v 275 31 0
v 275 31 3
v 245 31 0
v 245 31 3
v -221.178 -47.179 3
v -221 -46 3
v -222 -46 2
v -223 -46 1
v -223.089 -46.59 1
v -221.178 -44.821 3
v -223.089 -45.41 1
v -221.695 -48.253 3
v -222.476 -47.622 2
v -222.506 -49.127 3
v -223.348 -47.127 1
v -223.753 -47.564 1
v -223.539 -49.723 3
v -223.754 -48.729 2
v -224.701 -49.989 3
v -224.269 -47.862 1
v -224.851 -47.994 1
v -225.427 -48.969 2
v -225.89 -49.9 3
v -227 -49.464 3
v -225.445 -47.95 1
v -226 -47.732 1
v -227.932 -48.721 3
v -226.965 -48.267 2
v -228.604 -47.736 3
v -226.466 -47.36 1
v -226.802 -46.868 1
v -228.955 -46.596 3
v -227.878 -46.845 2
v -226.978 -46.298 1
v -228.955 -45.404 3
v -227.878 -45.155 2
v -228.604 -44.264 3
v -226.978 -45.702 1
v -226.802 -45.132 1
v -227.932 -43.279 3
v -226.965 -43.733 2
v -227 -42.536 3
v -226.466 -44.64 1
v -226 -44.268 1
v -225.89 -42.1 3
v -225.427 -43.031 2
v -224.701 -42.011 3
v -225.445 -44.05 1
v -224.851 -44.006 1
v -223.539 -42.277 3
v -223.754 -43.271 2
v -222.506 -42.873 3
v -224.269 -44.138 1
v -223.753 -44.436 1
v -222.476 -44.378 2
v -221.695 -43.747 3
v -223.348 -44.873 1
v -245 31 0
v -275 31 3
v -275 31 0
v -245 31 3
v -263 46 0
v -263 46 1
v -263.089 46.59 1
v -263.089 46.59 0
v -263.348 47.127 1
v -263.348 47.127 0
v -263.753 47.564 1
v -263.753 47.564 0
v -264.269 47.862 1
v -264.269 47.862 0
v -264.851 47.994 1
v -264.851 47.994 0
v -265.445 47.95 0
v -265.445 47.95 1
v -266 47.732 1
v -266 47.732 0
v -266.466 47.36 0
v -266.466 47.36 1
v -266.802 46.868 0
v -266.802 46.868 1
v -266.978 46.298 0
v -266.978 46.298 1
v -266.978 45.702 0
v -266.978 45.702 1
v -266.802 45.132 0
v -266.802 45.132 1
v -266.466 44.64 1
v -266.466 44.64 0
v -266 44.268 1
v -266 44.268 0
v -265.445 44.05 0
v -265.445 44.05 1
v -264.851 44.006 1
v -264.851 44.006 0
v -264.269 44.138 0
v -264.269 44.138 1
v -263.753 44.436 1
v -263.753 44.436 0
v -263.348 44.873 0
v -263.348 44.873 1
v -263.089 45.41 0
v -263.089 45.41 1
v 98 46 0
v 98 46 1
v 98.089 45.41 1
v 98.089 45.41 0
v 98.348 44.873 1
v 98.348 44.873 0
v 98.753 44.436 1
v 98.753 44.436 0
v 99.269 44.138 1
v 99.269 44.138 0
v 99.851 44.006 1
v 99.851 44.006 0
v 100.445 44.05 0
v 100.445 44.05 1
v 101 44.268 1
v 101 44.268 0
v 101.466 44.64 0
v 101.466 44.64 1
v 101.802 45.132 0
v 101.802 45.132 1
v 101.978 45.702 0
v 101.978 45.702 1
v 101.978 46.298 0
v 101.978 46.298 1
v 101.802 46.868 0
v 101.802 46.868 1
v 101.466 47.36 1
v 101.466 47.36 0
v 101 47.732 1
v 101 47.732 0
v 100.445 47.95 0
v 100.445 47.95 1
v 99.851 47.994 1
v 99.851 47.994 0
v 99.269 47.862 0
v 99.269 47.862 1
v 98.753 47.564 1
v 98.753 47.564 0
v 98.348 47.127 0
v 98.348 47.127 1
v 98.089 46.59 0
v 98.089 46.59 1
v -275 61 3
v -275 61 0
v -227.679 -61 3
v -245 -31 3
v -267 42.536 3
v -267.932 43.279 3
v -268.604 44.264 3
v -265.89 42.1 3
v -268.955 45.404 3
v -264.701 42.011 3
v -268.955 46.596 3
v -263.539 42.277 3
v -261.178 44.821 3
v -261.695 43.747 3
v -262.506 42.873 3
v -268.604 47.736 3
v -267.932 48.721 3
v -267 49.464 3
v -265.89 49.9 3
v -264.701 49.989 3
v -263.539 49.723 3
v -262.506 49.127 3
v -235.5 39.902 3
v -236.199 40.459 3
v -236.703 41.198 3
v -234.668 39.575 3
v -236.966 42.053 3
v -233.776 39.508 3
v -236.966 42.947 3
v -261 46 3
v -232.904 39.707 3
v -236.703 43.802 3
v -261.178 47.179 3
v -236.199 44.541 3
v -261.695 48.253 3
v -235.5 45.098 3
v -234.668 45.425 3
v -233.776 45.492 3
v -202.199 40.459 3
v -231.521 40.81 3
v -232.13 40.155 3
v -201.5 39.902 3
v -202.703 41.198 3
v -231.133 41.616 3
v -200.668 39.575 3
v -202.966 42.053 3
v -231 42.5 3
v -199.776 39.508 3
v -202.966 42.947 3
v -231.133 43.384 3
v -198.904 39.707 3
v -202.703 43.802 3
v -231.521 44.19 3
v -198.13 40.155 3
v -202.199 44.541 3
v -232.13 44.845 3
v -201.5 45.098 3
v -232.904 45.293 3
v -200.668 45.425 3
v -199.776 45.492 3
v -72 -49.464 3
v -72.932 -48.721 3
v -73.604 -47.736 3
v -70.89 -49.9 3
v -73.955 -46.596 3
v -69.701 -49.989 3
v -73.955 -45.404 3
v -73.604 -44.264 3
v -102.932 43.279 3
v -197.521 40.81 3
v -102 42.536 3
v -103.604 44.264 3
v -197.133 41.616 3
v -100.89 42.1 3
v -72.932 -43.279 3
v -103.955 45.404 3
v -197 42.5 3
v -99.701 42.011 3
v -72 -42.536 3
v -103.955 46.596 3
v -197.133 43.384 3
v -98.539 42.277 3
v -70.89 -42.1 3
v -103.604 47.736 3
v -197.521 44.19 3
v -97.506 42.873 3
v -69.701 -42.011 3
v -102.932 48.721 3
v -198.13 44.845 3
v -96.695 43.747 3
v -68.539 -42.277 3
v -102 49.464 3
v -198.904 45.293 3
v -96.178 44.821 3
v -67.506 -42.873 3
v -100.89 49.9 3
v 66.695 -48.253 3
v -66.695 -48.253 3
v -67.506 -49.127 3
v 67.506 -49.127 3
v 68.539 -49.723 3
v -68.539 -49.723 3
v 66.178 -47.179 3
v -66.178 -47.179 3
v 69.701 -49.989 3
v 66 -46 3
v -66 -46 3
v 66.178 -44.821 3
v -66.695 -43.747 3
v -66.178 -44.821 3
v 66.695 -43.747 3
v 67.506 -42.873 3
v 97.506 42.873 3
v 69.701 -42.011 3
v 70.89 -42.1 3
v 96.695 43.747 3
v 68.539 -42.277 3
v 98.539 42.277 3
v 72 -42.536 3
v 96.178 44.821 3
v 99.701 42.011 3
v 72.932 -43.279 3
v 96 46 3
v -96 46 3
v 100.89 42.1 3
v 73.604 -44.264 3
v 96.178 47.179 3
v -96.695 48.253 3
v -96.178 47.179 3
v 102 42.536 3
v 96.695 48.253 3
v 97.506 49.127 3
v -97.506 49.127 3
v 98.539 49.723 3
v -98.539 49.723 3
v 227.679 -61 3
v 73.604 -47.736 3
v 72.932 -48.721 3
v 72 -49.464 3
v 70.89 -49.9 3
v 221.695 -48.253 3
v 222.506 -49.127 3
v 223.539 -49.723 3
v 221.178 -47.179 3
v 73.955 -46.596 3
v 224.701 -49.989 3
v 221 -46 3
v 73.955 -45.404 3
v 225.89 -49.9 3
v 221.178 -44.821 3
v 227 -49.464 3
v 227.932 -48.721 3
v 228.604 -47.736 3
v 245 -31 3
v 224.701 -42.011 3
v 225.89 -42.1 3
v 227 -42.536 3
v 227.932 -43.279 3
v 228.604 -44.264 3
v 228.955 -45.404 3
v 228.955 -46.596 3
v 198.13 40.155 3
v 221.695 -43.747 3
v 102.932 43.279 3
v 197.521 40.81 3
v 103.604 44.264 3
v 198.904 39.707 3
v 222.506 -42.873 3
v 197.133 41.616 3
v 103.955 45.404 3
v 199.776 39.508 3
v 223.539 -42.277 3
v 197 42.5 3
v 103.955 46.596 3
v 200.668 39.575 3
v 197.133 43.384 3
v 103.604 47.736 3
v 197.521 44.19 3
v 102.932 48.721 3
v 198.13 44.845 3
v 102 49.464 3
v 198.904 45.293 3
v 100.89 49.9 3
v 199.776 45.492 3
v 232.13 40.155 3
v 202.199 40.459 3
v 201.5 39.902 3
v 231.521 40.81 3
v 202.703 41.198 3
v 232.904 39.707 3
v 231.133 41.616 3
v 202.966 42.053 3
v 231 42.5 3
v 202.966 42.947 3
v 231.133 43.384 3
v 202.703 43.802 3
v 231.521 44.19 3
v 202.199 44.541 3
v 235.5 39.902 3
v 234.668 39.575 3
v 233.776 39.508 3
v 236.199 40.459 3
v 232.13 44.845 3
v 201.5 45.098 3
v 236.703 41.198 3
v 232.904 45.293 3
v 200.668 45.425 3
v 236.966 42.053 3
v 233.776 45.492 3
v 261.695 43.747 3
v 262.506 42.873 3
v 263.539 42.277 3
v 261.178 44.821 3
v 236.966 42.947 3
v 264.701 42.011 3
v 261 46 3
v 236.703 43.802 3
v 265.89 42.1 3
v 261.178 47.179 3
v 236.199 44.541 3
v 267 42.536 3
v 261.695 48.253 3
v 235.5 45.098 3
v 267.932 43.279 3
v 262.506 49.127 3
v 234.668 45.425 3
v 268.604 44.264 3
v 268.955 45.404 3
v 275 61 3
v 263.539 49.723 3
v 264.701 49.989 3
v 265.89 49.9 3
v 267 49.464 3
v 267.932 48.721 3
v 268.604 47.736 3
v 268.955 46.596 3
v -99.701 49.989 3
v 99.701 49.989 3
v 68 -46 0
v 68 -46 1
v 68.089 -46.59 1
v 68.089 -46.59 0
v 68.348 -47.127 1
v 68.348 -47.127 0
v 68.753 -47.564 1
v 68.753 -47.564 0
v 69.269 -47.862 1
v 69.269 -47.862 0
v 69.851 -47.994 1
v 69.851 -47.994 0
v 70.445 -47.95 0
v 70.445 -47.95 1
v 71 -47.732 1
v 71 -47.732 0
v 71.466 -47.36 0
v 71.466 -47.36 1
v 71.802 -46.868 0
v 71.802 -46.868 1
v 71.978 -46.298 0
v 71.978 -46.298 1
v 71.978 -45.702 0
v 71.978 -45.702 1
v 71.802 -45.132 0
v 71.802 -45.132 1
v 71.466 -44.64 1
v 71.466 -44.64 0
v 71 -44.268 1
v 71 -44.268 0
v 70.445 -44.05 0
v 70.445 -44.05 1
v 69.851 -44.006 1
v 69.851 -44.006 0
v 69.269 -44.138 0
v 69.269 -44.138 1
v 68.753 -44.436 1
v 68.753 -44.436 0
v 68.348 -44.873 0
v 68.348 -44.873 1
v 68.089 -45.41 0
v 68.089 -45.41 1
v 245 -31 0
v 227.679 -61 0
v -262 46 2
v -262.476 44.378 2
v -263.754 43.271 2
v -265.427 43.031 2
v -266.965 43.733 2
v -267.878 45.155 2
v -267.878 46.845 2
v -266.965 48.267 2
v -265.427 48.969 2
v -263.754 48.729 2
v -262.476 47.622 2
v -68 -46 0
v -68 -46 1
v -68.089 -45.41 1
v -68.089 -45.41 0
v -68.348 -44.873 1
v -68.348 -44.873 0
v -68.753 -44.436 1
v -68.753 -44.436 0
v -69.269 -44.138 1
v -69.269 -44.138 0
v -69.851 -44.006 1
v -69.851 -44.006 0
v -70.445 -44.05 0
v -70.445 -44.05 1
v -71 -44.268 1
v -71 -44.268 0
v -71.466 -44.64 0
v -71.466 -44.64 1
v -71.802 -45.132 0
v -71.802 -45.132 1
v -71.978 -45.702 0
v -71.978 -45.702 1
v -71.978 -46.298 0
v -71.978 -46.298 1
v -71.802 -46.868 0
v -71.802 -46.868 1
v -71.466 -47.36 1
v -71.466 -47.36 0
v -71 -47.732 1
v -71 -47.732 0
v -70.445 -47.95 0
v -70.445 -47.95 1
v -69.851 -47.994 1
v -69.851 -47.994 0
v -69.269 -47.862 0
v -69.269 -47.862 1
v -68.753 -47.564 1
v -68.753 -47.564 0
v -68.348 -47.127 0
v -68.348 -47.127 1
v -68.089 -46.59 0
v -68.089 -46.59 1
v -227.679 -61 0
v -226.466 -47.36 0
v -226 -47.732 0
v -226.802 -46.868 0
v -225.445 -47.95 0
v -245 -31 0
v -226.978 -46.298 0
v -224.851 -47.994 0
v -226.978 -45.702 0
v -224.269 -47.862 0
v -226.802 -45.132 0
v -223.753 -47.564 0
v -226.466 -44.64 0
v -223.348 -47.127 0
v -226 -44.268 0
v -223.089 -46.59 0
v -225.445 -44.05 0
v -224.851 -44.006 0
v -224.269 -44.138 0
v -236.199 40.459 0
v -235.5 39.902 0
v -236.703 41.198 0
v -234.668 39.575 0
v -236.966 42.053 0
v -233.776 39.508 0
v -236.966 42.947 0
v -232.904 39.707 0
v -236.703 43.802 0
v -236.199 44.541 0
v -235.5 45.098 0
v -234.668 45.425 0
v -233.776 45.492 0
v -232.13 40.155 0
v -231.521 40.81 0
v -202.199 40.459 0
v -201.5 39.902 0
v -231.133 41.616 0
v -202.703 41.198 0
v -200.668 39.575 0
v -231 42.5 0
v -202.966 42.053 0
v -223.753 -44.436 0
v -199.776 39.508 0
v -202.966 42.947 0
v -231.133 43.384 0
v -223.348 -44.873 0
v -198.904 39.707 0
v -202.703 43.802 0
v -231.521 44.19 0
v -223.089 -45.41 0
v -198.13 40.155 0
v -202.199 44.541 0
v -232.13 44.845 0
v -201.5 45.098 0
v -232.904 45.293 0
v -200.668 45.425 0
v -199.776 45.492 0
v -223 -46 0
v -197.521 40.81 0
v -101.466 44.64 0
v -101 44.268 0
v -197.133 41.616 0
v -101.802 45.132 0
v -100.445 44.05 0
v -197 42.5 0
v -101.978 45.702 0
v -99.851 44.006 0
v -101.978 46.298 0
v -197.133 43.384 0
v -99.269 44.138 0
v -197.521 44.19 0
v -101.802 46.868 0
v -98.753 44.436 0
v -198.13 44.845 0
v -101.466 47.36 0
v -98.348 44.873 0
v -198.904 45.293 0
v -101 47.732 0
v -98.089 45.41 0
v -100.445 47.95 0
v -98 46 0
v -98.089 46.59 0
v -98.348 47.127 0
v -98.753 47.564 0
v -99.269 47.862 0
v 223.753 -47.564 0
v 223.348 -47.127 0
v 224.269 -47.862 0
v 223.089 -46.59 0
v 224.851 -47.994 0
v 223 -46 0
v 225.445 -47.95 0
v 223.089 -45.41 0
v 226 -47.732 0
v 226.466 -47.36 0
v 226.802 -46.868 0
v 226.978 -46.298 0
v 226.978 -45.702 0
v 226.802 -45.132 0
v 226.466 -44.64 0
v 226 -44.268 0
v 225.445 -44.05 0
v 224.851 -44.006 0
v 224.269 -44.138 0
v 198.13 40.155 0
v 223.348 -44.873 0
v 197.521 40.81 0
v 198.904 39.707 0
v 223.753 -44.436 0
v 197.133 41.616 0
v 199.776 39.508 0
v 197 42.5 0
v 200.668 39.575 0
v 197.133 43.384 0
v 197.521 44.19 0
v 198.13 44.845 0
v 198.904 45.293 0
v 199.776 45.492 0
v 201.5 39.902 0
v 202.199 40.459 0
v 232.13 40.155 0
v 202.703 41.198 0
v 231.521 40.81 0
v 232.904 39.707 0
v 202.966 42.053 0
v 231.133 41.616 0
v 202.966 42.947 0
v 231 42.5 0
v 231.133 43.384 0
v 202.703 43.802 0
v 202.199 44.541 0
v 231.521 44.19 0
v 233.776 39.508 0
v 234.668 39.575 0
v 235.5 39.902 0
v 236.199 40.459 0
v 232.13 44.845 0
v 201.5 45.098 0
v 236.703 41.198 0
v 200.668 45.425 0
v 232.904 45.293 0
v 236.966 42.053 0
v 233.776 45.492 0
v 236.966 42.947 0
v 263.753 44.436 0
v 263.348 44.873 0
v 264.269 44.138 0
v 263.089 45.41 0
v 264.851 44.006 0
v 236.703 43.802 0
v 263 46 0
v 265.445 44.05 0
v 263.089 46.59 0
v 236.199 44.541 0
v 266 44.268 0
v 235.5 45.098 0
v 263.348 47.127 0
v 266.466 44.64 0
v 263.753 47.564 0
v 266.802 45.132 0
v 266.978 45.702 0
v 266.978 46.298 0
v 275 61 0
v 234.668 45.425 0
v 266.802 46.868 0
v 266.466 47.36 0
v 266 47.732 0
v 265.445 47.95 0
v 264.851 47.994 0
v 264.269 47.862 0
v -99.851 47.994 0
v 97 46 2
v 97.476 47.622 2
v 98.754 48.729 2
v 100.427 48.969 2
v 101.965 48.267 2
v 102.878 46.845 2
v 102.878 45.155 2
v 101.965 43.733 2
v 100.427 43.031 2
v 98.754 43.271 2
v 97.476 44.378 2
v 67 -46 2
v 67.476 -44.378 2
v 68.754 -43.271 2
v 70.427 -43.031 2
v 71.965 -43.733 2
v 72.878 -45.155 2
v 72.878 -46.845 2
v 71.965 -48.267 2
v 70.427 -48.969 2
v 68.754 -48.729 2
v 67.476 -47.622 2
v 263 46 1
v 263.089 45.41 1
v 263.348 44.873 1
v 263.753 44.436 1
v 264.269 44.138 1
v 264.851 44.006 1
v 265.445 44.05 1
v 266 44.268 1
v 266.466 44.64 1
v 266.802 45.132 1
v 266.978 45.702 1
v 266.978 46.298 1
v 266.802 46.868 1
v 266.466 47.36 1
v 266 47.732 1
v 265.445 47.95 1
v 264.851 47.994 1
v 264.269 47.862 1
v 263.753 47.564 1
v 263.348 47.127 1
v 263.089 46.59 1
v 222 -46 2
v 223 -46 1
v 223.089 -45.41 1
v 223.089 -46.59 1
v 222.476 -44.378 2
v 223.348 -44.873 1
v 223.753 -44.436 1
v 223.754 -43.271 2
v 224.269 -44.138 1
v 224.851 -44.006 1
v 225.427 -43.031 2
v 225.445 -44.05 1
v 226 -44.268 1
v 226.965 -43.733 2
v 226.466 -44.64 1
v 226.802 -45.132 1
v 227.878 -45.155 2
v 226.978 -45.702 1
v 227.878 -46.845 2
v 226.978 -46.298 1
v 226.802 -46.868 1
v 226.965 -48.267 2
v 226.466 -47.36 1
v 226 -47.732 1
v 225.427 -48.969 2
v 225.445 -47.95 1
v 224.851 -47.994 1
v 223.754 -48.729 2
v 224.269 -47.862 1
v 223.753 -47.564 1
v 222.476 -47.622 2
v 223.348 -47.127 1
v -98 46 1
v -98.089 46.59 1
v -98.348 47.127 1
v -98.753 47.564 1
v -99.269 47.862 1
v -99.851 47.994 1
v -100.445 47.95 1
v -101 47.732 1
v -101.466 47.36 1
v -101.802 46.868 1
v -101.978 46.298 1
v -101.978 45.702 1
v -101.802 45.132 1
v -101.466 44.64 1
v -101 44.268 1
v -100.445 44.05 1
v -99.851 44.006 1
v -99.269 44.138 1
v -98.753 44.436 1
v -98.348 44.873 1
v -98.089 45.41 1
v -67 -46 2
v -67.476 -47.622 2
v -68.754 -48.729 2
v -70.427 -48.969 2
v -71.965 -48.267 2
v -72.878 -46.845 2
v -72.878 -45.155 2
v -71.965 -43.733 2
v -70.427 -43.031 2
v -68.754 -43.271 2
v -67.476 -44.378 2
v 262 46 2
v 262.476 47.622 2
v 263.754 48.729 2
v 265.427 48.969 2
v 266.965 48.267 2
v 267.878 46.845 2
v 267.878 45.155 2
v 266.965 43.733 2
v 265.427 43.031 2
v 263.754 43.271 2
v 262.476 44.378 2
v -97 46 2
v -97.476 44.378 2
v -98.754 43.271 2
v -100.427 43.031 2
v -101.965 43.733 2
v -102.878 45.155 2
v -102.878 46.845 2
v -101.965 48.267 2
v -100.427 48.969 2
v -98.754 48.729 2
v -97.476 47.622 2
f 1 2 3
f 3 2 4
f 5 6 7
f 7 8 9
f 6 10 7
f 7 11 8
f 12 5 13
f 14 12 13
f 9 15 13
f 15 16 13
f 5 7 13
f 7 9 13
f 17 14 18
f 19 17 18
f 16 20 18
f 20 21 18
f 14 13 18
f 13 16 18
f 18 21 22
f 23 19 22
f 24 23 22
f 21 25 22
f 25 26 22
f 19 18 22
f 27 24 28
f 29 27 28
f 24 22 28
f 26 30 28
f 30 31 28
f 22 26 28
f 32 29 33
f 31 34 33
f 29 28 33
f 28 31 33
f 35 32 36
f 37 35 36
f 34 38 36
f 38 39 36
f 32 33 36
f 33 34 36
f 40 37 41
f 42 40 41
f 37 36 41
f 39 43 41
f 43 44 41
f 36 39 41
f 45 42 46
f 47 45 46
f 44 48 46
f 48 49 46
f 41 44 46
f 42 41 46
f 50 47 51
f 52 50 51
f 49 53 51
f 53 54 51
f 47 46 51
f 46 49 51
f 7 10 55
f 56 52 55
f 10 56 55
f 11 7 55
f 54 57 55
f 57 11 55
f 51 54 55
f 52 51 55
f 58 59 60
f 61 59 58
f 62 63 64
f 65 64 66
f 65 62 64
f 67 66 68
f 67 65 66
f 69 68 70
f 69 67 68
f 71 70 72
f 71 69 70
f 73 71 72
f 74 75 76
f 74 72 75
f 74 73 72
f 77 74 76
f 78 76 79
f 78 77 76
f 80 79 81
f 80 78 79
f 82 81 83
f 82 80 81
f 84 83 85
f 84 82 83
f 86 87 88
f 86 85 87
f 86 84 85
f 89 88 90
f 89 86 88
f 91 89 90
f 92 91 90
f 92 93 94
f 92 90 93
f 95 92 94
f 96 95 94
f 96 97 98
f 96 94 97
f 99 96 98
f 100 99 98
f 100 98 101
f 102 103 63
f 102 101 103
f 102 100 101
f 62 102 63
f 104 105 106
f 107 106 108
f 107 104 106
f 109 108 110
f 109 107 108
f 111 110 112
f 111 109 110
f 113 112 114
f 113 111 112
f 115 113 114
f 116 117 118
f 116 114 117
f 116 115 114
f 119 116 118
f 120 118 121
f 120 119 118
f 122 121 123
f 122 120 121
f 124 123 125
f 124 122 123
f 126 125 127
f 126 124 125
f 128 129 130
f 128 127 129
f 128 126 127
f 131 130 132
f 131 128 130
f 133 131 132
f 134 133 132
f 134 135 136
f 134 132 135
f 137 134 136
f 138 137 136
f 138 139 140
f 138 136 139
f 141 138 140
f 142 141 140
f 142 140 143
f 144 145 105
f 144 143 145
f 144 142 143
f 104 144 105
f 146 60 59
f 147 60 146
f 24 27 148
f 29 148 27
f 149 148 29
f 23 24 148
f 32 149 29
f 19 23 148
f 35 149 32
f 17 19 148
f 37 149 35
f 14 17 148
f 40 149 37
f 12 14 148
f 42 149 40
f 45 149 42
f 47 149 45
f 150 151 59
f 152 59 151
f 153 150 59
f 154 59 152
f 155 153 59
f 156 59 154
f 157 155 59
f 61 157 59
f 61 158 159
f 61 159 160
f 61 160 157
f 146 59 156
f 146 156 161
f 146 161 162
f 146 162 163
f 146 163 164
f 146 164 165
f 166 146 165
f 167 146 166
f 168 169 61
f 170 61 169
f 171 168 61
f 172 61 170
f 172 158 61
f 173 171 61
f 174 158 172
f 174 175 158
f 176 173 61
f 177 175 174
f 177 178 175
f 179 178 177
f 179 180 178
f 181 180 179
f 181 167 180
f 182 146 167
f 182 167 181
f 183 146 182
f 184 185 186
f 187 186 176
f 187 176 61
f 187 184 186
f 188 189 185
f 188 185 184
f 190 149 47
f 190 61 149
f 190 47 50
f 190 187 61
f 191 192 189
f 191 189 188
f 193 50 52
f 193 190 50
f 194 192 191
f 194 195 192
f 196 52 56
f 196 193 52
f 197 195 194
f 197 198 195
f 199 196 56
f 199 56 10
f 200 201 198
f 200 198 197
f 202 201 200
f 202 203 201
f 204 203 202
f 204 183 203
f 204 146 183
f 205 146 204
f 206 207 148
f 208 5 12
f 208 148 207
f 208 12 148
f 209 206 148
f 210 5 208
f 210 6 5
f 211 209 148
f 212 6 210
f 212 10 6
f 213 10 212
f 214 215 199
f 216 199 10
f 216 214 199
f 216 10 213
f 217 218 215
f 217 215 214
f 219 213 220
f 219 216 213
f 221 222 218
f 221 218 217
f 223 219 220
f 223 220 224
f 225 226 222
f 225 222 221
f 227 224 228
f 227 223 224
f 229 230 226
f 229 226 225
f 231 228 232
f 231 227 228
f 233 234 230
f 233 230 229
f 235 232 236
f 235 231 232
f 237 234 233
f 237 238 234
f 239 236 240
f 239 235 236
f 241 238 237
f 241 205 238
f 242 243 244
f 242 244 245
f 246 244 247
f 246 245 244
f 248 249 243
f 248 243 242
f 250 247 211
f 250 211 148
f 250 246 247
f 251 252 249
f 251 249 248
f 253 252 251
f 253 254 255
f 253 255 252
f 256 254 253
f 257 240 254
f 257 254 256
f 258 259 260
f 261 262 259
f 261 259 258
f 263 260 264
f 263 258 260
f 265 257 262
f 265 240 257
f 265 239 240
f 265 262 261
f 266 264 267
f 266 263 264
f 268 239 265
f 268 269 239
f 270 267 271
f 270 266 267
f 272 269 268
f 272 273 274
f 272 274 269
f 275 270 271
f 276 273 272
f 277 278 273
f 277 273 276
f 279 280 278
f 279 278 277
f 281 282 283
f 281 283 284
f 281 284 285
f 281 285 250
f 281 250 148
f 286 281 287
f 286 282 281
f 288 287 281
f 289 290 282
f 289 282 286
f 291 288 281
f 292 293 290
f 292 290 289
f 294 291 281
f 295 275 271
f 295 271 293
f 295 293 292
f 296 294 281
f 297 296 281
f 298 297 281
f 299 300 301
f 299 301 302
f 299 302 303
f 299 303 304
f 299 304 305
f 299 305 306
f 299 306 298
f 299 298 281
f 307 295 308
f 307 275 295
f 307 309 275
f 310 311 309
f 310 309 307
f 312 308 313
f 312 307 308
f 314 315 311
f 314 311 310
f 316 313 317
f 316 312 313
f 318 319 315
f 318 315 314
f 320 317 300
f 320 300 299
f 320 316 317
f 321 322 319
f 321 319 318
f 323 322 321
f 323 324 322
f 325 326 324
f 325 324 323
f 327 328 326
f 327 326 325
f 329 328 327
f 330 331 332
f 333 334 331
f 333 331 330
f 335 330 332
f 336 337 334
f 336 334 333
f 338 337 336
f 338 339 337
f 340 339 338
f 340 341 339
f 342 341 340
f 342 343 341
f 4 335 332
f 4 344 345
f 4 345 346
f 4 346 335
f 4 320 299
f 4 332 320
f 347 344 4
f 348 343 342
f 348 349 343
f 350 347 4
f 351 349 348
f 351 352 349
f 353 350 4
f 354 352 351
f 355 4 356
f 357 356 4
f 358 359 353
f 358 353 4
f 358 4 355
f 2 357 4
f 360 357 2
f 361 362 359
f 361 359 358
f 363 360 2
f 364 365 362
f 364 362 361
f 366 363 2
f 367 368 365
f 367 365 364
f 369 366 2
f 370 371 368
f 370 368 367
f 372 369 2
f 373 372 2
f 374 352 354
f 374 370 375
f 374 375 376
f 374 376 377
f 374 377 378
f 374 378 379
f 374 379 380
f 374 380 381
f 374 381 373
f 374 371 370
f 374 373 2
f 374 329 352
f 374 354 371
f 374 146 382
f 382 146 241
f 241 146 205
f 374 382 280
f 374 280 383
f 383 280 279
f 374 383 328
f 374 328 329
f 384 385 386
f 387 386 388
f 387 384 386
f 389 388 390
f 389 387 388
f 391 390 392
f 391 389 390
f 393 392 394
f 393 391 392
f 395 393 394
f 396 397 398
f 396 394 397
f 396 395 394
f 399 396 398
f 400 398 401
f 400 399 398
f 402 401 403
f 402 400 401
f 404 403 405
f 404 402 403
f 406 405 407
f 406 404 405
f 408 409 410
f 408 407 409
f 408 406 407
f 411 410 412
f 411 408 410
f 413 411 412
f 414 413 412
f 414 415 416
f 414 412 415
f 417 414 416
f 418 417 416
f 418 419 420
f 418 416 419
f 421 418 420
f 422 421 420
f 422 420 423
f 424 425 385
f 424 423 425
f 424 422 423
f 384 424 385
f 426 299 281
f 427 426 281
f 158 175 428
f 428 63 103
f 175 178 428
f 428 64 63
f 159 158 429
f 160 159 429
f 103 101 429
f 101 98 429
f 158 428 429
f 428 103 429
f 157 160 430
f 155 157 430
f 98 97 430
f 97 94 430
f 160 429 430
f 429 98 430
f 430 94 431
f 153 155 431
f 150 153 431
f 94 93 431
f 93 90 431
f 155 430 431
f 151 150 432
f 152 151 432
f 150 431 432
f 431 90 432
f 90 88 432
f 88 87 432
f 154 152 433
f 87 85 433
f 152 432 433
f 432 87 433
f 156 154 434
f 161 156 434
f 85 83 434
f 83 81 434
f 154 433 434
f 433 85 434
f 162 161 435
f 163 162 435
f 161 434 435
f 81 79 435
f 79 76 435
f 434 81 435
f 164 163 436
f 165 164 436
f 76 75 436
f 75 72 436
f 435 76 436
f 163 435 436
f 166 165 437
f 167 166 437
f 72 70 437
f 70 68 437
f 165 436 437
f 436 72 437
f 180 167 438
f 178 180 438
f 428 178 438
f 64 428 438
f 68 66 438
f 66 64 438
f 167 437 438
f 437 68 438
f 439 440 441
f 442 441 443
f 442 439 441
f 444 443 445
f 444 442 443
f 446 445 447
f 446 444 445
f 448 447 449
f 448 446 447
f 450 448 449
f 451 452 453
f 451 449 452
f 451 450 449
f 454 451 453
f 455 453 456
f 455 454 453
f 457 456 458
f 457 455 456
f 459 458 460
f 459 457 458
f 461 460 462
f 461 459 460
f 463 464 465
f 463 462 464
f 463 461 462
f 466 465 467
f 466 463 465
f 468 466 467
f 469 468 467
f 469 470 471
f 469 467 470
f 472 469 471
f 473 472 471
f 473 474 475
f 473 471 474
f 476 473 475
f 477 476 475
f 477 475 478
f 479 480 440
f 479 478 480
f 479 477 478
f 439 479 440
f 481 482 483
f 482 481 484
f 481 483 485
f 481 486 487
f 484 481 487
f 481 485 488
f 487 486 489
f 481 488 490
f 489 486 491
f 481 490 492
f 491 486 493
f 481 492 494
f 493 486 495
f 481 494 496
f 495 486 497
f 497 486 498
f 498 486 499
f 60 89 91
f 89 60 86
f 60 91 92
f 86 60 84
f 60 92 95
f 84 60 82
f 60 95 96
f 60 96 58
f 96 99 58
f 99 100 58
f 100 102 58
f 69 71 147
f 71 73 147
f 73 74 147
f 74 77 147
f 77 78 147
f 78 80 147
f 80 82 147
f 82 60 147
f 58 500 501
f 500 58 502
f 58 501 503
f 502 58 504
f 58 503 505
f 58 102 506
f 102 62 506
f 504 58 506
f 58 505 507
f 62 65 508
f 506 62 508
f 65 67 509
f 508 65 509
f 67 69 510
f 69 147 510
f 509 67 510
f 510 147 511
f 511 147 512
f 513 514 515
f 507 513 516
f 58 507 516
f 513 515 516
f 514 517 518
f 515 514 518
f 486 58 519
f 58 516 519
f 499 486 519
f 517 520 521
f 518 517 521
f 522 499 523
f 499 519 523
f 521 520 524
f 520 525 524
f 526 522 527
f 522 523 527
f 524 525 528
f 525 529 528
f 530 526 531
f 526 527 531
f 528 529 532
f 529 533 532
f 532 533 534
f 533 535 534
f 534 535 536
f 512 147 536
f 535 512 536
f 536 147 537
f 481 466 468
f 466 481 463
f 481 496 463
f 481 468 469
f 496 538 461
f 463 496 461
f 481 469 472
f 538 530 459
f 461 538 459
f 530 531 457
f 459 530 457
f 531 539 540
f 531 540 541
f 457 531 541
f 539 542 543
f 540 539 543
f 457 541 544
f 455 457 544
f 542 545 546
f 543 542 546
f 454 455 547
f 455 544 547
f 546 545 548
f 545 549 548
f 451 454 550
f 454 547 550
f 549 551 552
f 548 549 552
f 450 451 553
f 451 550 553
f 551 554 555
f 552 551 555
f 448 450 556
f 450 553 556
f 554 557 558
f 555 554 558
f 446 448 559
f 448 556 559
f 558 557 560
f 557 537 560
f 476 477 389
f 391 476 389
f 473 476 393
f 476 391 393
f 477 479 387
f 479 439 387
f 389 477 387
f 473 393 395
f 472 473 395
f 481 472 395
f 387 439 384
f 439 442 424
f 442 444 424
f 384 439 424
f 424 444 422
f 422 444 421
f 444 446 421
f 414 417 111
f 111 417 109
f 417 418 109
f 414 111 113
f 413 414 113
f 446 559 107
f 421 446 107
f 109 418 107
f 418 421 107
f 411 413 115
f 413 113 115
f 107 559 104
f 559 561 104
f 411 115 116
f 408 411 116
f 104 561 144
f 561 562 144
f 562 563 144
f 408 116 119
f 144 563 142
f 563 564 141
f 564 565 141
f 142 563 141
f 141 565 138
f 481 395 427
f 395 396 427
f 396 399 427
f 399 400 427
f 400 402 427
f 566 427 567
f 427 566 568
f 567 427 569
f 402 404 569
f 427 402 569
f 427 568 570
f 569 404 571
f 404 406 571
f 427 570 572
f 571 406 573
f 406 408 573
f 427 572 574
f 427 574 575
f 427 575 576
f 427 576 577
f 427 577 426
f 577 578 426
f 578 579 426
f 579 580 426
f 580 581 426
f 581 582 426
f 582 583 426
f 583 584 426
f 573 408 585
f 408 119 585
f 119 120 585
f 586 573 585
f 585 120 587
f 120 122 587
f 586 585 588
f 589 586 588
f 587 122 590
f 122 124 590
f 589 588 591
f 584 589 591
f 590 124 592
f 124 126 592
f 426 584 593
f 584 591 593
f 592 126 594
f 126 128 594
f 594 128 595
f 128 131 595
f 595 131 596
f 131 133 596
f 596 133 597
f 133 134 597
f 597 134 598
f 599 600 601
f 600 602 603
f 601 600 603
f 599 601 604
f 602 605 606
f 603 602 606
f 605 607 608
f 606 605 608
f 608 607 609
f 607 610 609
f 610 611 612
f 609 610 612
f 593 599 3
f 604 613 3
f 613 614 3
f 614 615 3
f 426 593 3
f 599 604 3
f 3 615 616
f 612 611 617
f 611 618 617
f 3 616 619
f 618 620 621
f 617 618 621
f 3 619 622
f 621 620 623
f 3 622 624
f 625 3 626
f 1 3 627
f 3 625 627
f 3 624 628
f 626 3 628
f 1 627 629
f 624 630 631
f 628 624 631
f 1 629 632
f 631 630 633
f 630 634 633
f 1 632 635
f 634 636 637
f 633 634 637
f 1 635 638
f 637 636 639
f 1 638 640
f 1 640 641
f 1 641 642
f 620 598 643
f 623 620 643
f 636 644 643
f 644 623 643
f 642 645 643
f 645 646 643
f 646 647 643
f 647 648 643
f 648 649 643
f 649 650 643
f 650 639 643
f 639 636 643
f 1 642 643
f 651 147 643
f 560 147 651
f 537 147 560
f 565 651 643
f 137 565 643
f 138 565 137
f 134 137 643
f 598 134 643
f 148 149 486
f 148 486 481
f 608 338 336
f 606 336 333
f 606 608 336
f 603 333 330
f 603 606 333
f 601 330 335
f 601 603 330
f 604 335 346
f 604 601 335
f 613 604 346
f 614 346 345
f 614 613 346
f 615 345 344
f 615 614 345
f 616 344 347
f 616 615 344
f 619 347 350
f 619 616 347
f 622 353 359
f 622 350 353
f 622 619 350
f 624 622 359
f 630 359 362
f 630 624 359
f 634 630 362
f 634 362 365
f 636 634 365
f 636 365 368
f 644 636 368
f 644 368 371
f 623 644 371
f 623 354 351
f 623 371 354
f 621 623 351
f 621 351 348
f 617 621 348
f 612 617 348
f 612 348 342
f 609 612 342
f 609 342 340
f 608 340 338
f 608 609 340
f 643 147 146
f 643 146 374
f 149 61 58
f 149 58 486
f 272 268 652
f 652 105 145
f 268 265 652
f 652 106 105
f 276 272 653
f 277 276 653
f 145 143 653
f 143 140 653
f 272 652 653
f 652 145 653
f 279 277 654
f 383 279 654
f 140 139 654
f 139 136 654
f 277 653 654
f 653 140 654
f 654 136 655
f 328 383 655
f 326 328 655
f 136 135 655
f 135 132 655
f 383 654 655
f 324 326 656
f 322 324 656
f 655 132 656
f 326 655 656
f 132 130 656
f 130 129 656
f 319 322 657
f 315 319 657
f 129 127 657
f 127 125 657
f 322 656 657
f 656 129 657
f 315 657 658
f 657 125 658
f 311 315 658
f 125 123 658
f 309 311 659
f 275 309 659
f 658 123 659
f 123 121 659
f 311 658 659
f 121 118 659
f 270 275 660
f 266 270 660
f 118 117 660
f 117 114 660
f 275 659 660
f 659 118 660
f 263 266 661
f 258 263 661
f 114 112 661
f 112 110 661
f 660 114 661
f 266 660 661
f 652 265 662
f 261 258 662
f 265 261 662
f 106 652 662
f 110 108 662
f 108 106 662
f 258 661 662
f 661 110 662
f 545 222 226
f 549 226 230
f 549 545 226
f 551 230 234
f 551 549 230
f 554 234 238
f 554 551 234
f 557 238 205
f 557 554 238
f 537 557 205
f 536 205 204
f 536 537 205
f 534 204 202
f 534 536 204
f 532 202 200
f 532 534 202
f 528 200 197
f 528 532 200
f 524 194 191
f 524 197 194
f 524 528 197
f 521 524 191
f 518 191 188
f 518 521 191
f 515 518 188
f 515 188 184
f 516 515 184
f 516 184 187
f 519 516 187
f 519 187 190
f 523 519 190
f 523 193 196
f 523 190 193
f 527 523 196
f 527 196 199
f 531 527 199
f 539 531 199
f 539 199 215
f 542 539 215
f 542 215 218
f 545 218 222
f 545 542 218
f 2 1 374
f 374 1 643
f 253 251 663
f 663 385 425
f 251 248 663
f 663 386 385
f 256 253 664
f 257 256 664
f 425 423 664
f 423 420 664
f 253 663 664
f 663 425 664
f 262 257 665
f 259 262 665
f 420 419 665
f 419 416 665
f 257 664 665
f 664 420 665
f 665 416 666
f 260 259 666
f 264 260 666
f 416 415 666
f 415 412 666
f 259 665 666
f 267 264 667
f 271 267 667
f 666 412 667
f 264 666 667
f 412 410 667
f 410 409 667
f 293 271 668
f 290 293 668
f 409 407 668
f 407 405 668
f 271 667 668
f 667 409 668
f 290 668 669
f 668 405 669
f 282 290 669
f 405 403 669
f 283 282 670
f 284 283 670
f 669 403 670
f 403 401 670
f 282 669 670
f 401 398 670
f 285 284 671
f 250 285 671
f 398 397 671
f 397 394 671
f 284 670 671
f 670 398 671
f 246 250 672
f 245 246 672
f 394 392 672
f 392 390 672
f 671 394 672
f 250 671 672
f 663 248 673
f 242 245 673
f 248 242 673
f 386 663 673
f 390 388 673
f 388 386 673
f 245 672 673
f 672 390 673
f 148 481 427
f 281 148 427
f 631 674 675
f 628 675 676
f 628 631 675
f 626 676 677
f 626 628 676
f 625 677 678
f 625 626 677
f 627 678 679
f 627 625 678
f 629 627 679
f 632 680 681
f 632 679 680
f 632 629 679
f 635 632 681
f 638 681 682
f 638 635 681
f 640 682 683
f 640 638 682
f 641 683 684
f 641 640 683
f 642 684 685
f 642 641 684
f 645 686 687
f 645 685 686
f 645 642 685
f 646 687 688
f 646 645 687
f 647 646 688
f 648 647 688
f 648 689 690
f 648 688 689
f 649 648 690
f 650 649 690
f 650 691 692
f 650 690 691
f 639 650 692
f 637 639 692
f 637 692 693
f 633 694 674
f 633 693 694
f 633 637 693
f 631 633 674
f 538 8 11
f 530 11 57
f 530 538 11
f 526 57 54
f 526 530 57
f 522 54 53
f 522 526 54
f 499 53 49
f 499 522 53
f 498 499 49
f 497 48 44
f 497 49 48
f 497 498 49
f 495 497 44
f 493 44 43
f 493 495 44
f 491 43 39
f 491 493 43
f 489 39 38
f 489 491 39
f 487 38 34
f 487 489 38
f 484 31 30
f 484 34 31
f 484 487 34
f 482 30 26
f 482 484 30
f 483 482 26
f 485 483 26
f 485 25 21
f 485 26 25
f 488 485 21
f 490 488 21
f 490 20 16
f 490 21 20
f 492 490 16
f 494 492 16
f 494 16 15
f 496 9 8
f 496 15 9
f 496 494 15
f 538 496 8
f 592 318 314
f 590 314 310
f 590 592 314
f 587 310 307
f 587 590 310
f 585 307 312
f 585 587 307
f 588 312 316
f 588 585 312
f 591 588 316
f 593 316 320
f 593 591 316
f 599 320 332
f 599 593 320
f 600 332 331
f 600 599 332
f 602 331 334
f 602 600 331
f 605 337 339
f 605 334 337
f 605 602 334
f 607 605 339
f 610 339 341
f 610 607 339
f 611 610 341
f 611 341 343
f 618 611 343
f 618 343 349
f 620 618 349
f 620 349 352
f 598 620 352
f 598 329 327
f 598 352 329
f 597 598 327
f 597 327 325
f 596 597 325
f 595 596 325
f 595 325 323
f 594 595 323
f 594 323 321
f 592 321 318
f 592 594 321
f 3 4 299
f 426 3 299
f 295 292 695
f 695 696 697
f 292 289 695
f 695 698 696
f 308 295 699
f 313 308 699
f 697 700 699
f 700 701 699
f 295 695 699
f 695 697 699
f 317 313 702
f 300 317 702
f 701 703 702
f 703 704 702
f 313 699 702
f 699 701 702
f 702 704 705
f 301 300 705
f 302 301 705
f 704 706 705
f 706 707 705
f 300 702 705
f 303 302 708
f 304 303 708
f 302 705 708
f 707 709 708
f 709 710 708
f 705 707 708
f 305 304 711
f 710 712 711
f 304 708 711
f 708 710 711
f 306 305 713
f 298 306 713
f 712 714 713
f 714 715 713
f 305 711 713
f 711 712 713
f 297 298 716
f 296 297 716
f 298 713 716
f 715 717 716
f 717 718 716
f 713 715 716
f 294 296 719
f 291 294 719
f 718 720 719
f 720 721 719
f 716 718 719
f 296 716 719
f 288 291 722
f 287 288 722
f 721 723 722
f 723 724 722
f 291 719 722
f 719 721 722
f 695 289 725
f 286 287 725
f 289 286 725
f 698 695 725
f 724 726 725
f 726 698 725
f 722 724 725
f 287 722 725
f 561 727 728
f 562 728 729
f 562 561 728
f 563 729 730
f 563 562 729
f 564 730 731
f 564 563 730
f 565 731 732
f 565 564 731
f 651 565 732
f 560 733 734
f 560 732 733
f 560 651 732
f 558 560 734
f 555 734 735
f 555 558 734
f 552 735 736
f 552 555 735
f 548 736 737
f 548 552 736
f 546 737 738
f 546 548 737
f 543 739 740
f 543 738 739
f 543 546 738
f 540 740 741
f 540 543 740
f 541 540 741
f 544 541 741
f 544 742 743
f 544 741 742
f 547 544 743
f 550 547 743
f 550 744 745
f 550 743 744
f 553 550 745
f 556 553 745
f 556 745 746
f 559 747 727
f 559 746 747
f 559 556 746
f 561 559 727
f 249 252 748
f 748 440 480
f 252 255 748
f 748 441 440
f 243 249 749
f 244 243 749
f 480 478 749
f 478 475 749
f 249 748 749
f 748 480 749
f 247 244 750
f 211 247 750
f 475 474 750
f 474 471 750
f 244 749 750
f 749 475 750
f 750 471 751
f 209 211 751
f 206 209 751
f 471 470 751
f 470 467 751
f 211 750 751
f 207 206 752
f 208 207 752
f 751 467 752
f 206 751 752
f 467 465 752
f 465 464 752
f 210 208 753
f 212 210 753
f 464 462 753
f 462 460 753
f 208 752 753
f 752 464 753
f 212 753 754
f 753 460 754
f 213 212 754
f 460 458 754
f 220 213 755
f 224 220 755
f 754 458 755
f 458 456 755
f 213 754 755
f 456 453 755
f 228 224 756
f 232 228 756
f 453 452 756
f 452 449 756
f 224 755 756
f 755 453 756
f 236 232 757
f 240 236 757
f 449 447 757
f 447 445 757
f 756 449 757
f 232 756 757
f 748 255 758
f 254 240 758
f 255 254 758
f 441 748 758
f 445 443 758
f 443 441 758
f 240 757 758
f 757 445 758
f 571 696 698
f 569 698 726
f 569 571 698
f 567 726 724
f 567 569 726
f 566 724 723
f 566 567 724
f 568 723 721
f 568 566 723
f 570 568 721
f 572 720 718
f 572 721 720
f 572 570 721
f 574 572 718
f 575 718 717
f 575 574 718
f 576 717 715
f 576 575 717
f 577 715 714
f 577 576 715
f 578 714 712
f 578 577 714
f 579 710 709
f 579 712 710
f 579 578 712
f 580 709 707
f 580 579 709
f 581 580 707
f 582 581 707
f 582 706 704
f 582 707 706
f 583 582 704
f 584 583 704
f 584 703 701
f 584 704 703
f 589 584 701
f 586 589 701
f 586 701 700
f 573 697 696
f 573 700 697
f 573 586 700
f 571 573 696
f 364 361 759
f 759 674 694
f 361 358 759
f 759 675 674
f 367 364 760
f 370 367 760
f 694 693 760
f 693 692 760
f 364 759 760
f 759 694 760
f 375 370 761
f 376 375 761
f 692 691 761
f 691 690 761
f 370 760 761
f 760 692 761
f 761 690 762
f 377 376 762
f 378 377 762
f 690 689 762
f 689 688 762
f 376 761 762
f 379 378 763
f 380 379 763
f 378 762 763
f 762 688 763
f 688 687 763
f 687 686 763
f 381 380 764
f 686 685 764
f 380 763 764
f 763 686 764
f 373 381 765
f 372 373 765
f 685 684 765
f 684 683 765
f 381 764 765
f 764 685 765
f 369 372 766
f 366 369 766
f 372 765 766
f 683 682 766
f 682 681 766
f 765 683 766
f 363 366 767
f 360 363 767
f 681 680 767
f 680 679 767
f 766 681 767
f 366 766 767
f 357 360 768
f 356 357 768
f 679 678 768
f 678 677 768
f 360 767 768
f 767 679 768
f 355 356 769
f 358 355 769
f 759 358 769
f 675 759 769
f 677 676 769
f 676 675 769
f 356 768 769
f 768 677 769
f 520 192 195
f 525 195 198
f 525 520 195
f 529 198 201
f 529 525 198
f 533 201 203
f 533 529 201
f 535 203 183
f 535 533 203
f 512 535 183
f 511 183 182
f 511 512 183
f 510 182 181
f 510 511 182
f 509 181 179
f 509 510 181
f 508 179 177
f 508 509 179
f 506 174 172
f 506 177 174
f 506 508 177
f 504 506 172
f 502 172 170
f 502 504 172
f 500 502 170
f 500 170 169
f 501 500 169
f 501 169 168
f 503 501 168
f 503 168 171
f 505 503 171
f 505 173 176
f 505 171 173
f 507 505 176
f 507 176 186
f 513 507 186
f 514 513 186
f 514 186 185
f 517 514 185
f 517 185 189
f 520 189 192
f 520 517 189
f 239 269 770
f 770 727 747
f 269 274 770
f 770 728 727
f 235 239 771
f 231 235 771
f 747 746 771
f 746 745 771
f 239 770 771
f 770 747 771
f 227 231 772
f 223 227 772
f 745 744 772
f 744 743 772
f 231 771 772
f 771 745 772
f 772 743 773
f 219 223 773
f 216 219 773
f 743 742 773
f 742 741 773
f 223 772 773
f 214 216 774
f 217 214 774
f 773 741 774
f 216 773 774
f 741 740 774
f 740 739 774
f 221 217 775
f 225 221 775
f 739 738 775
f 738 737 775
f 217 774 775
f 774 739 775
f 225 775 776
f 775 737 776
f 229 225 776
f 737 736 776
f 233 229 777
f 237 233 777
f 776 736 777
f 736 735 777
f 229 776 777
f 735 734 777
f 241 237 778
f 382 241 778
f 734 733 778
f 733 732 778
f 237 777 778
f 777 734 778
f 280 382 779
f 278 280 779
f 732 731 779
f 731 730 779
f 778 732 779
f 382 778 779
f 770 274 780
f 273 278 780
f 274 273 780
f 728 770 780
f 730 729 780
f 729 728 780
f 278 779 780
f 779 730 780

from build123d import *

# Parameters (mm, degrees)
SKETCH_1_W          = 550
SKETCH_1_H          = 122
EXTRUDE_1_DEPTH     = 3
CUT_EXTRUDE_2_DEPTH = 282.700195243
SKETCH_2_R          = 3
SKETCH_2_R_2        = 2
CUT_EXTRUDE_1_DEPTH = 10
CHAMFER_1_SIZE      = 2


with BuildPart() as part:
    # 草图1 → 凸台-拉伸1 (new body)
    with BuildSketch(Plane.XY):
        Rectangle(SKETCH_1_W, SKETCH_1_H)
    extrude(amount=EXTRUDE_1_DEPTH)

    # 草图3 → 切除-拉伸2 (cut, through all)
    with BuildSketch(Plane.XY.offset(3)):
        Polygon((-275, 31), (-245, 31), (-245, -31), (-227.679491924, -61), (-275, -61), align=None)
        Polygon((245, -31), (227.679491924, -61), (275, -61), (275, 31), (245, 31), align=None)
    extrude(amount=-CUT_EXTRUDE_2_DEPTH, mode=Mode.SUBTRACT)

    # 草图2 → 切除-拉伸1 (cut)
    with BuildSketch(Plane.XY):
        with Locations((-200, 42.5)):
            Circle(SKETCH_2_R)
        with Locations((-234, 42.5)):
            Circle(SKETCH_2_R)
        with Locations(Location((234, 42.5, 0), (0, 0, 180))):
            Circle(SKETCH_2_R)
        with Locations(Location((200, 42.5, 0), (0, 0, 180))):
            Circle(SKETCH_2_R)
        with Locations((-265, 46)):
            Circle(SKETCH_2_R_2)
        with Locations((-100, 46)):
            Circle(SKETCH_2_R_2)
        with Locations((-225, -46)):
            Circle(SKETCH_2_R_2)
        with Locations((-70, -46)):
            Circle(SKETCH_2_R_2)
        with Locations(Location((225, -46, 0), (0, 0, 180))):
            Circle(SKETCH_2_R_2)
        with Locations(Location((70, -46, 0), (0, 0, 180))):
            Circle(SKETCH_2_R_2)
        with Locations(Location((100, 46, 0), (0, 0, 180))):
            Circle(SKETCH_2_R_2)
        with Locations(Location((265, 46, 0), (0, 0, 180))):
            Circle(SKETCH_2_R_2)
    extrude(amount=CUT_EXTRUDE_1_DEPTH, mode=Mode.SUBTRACT)

    # 倒角1
    chamfer_1_edges = [part.edges().sort_by_distance(p)[0] for p in [
        (227, -46, 3),
        (-72, -46, 3),
        (-227, -46, 3),
        (-102, 46, 3),
        (-267, 46, 3),
        (72, -46, 3),
        (102, 46, 3),
        (267, 46, 3),
    ]]
    chamfer(chamfer_1_edges, length=CHAMFER_1_SIZE)


solid = part.part
